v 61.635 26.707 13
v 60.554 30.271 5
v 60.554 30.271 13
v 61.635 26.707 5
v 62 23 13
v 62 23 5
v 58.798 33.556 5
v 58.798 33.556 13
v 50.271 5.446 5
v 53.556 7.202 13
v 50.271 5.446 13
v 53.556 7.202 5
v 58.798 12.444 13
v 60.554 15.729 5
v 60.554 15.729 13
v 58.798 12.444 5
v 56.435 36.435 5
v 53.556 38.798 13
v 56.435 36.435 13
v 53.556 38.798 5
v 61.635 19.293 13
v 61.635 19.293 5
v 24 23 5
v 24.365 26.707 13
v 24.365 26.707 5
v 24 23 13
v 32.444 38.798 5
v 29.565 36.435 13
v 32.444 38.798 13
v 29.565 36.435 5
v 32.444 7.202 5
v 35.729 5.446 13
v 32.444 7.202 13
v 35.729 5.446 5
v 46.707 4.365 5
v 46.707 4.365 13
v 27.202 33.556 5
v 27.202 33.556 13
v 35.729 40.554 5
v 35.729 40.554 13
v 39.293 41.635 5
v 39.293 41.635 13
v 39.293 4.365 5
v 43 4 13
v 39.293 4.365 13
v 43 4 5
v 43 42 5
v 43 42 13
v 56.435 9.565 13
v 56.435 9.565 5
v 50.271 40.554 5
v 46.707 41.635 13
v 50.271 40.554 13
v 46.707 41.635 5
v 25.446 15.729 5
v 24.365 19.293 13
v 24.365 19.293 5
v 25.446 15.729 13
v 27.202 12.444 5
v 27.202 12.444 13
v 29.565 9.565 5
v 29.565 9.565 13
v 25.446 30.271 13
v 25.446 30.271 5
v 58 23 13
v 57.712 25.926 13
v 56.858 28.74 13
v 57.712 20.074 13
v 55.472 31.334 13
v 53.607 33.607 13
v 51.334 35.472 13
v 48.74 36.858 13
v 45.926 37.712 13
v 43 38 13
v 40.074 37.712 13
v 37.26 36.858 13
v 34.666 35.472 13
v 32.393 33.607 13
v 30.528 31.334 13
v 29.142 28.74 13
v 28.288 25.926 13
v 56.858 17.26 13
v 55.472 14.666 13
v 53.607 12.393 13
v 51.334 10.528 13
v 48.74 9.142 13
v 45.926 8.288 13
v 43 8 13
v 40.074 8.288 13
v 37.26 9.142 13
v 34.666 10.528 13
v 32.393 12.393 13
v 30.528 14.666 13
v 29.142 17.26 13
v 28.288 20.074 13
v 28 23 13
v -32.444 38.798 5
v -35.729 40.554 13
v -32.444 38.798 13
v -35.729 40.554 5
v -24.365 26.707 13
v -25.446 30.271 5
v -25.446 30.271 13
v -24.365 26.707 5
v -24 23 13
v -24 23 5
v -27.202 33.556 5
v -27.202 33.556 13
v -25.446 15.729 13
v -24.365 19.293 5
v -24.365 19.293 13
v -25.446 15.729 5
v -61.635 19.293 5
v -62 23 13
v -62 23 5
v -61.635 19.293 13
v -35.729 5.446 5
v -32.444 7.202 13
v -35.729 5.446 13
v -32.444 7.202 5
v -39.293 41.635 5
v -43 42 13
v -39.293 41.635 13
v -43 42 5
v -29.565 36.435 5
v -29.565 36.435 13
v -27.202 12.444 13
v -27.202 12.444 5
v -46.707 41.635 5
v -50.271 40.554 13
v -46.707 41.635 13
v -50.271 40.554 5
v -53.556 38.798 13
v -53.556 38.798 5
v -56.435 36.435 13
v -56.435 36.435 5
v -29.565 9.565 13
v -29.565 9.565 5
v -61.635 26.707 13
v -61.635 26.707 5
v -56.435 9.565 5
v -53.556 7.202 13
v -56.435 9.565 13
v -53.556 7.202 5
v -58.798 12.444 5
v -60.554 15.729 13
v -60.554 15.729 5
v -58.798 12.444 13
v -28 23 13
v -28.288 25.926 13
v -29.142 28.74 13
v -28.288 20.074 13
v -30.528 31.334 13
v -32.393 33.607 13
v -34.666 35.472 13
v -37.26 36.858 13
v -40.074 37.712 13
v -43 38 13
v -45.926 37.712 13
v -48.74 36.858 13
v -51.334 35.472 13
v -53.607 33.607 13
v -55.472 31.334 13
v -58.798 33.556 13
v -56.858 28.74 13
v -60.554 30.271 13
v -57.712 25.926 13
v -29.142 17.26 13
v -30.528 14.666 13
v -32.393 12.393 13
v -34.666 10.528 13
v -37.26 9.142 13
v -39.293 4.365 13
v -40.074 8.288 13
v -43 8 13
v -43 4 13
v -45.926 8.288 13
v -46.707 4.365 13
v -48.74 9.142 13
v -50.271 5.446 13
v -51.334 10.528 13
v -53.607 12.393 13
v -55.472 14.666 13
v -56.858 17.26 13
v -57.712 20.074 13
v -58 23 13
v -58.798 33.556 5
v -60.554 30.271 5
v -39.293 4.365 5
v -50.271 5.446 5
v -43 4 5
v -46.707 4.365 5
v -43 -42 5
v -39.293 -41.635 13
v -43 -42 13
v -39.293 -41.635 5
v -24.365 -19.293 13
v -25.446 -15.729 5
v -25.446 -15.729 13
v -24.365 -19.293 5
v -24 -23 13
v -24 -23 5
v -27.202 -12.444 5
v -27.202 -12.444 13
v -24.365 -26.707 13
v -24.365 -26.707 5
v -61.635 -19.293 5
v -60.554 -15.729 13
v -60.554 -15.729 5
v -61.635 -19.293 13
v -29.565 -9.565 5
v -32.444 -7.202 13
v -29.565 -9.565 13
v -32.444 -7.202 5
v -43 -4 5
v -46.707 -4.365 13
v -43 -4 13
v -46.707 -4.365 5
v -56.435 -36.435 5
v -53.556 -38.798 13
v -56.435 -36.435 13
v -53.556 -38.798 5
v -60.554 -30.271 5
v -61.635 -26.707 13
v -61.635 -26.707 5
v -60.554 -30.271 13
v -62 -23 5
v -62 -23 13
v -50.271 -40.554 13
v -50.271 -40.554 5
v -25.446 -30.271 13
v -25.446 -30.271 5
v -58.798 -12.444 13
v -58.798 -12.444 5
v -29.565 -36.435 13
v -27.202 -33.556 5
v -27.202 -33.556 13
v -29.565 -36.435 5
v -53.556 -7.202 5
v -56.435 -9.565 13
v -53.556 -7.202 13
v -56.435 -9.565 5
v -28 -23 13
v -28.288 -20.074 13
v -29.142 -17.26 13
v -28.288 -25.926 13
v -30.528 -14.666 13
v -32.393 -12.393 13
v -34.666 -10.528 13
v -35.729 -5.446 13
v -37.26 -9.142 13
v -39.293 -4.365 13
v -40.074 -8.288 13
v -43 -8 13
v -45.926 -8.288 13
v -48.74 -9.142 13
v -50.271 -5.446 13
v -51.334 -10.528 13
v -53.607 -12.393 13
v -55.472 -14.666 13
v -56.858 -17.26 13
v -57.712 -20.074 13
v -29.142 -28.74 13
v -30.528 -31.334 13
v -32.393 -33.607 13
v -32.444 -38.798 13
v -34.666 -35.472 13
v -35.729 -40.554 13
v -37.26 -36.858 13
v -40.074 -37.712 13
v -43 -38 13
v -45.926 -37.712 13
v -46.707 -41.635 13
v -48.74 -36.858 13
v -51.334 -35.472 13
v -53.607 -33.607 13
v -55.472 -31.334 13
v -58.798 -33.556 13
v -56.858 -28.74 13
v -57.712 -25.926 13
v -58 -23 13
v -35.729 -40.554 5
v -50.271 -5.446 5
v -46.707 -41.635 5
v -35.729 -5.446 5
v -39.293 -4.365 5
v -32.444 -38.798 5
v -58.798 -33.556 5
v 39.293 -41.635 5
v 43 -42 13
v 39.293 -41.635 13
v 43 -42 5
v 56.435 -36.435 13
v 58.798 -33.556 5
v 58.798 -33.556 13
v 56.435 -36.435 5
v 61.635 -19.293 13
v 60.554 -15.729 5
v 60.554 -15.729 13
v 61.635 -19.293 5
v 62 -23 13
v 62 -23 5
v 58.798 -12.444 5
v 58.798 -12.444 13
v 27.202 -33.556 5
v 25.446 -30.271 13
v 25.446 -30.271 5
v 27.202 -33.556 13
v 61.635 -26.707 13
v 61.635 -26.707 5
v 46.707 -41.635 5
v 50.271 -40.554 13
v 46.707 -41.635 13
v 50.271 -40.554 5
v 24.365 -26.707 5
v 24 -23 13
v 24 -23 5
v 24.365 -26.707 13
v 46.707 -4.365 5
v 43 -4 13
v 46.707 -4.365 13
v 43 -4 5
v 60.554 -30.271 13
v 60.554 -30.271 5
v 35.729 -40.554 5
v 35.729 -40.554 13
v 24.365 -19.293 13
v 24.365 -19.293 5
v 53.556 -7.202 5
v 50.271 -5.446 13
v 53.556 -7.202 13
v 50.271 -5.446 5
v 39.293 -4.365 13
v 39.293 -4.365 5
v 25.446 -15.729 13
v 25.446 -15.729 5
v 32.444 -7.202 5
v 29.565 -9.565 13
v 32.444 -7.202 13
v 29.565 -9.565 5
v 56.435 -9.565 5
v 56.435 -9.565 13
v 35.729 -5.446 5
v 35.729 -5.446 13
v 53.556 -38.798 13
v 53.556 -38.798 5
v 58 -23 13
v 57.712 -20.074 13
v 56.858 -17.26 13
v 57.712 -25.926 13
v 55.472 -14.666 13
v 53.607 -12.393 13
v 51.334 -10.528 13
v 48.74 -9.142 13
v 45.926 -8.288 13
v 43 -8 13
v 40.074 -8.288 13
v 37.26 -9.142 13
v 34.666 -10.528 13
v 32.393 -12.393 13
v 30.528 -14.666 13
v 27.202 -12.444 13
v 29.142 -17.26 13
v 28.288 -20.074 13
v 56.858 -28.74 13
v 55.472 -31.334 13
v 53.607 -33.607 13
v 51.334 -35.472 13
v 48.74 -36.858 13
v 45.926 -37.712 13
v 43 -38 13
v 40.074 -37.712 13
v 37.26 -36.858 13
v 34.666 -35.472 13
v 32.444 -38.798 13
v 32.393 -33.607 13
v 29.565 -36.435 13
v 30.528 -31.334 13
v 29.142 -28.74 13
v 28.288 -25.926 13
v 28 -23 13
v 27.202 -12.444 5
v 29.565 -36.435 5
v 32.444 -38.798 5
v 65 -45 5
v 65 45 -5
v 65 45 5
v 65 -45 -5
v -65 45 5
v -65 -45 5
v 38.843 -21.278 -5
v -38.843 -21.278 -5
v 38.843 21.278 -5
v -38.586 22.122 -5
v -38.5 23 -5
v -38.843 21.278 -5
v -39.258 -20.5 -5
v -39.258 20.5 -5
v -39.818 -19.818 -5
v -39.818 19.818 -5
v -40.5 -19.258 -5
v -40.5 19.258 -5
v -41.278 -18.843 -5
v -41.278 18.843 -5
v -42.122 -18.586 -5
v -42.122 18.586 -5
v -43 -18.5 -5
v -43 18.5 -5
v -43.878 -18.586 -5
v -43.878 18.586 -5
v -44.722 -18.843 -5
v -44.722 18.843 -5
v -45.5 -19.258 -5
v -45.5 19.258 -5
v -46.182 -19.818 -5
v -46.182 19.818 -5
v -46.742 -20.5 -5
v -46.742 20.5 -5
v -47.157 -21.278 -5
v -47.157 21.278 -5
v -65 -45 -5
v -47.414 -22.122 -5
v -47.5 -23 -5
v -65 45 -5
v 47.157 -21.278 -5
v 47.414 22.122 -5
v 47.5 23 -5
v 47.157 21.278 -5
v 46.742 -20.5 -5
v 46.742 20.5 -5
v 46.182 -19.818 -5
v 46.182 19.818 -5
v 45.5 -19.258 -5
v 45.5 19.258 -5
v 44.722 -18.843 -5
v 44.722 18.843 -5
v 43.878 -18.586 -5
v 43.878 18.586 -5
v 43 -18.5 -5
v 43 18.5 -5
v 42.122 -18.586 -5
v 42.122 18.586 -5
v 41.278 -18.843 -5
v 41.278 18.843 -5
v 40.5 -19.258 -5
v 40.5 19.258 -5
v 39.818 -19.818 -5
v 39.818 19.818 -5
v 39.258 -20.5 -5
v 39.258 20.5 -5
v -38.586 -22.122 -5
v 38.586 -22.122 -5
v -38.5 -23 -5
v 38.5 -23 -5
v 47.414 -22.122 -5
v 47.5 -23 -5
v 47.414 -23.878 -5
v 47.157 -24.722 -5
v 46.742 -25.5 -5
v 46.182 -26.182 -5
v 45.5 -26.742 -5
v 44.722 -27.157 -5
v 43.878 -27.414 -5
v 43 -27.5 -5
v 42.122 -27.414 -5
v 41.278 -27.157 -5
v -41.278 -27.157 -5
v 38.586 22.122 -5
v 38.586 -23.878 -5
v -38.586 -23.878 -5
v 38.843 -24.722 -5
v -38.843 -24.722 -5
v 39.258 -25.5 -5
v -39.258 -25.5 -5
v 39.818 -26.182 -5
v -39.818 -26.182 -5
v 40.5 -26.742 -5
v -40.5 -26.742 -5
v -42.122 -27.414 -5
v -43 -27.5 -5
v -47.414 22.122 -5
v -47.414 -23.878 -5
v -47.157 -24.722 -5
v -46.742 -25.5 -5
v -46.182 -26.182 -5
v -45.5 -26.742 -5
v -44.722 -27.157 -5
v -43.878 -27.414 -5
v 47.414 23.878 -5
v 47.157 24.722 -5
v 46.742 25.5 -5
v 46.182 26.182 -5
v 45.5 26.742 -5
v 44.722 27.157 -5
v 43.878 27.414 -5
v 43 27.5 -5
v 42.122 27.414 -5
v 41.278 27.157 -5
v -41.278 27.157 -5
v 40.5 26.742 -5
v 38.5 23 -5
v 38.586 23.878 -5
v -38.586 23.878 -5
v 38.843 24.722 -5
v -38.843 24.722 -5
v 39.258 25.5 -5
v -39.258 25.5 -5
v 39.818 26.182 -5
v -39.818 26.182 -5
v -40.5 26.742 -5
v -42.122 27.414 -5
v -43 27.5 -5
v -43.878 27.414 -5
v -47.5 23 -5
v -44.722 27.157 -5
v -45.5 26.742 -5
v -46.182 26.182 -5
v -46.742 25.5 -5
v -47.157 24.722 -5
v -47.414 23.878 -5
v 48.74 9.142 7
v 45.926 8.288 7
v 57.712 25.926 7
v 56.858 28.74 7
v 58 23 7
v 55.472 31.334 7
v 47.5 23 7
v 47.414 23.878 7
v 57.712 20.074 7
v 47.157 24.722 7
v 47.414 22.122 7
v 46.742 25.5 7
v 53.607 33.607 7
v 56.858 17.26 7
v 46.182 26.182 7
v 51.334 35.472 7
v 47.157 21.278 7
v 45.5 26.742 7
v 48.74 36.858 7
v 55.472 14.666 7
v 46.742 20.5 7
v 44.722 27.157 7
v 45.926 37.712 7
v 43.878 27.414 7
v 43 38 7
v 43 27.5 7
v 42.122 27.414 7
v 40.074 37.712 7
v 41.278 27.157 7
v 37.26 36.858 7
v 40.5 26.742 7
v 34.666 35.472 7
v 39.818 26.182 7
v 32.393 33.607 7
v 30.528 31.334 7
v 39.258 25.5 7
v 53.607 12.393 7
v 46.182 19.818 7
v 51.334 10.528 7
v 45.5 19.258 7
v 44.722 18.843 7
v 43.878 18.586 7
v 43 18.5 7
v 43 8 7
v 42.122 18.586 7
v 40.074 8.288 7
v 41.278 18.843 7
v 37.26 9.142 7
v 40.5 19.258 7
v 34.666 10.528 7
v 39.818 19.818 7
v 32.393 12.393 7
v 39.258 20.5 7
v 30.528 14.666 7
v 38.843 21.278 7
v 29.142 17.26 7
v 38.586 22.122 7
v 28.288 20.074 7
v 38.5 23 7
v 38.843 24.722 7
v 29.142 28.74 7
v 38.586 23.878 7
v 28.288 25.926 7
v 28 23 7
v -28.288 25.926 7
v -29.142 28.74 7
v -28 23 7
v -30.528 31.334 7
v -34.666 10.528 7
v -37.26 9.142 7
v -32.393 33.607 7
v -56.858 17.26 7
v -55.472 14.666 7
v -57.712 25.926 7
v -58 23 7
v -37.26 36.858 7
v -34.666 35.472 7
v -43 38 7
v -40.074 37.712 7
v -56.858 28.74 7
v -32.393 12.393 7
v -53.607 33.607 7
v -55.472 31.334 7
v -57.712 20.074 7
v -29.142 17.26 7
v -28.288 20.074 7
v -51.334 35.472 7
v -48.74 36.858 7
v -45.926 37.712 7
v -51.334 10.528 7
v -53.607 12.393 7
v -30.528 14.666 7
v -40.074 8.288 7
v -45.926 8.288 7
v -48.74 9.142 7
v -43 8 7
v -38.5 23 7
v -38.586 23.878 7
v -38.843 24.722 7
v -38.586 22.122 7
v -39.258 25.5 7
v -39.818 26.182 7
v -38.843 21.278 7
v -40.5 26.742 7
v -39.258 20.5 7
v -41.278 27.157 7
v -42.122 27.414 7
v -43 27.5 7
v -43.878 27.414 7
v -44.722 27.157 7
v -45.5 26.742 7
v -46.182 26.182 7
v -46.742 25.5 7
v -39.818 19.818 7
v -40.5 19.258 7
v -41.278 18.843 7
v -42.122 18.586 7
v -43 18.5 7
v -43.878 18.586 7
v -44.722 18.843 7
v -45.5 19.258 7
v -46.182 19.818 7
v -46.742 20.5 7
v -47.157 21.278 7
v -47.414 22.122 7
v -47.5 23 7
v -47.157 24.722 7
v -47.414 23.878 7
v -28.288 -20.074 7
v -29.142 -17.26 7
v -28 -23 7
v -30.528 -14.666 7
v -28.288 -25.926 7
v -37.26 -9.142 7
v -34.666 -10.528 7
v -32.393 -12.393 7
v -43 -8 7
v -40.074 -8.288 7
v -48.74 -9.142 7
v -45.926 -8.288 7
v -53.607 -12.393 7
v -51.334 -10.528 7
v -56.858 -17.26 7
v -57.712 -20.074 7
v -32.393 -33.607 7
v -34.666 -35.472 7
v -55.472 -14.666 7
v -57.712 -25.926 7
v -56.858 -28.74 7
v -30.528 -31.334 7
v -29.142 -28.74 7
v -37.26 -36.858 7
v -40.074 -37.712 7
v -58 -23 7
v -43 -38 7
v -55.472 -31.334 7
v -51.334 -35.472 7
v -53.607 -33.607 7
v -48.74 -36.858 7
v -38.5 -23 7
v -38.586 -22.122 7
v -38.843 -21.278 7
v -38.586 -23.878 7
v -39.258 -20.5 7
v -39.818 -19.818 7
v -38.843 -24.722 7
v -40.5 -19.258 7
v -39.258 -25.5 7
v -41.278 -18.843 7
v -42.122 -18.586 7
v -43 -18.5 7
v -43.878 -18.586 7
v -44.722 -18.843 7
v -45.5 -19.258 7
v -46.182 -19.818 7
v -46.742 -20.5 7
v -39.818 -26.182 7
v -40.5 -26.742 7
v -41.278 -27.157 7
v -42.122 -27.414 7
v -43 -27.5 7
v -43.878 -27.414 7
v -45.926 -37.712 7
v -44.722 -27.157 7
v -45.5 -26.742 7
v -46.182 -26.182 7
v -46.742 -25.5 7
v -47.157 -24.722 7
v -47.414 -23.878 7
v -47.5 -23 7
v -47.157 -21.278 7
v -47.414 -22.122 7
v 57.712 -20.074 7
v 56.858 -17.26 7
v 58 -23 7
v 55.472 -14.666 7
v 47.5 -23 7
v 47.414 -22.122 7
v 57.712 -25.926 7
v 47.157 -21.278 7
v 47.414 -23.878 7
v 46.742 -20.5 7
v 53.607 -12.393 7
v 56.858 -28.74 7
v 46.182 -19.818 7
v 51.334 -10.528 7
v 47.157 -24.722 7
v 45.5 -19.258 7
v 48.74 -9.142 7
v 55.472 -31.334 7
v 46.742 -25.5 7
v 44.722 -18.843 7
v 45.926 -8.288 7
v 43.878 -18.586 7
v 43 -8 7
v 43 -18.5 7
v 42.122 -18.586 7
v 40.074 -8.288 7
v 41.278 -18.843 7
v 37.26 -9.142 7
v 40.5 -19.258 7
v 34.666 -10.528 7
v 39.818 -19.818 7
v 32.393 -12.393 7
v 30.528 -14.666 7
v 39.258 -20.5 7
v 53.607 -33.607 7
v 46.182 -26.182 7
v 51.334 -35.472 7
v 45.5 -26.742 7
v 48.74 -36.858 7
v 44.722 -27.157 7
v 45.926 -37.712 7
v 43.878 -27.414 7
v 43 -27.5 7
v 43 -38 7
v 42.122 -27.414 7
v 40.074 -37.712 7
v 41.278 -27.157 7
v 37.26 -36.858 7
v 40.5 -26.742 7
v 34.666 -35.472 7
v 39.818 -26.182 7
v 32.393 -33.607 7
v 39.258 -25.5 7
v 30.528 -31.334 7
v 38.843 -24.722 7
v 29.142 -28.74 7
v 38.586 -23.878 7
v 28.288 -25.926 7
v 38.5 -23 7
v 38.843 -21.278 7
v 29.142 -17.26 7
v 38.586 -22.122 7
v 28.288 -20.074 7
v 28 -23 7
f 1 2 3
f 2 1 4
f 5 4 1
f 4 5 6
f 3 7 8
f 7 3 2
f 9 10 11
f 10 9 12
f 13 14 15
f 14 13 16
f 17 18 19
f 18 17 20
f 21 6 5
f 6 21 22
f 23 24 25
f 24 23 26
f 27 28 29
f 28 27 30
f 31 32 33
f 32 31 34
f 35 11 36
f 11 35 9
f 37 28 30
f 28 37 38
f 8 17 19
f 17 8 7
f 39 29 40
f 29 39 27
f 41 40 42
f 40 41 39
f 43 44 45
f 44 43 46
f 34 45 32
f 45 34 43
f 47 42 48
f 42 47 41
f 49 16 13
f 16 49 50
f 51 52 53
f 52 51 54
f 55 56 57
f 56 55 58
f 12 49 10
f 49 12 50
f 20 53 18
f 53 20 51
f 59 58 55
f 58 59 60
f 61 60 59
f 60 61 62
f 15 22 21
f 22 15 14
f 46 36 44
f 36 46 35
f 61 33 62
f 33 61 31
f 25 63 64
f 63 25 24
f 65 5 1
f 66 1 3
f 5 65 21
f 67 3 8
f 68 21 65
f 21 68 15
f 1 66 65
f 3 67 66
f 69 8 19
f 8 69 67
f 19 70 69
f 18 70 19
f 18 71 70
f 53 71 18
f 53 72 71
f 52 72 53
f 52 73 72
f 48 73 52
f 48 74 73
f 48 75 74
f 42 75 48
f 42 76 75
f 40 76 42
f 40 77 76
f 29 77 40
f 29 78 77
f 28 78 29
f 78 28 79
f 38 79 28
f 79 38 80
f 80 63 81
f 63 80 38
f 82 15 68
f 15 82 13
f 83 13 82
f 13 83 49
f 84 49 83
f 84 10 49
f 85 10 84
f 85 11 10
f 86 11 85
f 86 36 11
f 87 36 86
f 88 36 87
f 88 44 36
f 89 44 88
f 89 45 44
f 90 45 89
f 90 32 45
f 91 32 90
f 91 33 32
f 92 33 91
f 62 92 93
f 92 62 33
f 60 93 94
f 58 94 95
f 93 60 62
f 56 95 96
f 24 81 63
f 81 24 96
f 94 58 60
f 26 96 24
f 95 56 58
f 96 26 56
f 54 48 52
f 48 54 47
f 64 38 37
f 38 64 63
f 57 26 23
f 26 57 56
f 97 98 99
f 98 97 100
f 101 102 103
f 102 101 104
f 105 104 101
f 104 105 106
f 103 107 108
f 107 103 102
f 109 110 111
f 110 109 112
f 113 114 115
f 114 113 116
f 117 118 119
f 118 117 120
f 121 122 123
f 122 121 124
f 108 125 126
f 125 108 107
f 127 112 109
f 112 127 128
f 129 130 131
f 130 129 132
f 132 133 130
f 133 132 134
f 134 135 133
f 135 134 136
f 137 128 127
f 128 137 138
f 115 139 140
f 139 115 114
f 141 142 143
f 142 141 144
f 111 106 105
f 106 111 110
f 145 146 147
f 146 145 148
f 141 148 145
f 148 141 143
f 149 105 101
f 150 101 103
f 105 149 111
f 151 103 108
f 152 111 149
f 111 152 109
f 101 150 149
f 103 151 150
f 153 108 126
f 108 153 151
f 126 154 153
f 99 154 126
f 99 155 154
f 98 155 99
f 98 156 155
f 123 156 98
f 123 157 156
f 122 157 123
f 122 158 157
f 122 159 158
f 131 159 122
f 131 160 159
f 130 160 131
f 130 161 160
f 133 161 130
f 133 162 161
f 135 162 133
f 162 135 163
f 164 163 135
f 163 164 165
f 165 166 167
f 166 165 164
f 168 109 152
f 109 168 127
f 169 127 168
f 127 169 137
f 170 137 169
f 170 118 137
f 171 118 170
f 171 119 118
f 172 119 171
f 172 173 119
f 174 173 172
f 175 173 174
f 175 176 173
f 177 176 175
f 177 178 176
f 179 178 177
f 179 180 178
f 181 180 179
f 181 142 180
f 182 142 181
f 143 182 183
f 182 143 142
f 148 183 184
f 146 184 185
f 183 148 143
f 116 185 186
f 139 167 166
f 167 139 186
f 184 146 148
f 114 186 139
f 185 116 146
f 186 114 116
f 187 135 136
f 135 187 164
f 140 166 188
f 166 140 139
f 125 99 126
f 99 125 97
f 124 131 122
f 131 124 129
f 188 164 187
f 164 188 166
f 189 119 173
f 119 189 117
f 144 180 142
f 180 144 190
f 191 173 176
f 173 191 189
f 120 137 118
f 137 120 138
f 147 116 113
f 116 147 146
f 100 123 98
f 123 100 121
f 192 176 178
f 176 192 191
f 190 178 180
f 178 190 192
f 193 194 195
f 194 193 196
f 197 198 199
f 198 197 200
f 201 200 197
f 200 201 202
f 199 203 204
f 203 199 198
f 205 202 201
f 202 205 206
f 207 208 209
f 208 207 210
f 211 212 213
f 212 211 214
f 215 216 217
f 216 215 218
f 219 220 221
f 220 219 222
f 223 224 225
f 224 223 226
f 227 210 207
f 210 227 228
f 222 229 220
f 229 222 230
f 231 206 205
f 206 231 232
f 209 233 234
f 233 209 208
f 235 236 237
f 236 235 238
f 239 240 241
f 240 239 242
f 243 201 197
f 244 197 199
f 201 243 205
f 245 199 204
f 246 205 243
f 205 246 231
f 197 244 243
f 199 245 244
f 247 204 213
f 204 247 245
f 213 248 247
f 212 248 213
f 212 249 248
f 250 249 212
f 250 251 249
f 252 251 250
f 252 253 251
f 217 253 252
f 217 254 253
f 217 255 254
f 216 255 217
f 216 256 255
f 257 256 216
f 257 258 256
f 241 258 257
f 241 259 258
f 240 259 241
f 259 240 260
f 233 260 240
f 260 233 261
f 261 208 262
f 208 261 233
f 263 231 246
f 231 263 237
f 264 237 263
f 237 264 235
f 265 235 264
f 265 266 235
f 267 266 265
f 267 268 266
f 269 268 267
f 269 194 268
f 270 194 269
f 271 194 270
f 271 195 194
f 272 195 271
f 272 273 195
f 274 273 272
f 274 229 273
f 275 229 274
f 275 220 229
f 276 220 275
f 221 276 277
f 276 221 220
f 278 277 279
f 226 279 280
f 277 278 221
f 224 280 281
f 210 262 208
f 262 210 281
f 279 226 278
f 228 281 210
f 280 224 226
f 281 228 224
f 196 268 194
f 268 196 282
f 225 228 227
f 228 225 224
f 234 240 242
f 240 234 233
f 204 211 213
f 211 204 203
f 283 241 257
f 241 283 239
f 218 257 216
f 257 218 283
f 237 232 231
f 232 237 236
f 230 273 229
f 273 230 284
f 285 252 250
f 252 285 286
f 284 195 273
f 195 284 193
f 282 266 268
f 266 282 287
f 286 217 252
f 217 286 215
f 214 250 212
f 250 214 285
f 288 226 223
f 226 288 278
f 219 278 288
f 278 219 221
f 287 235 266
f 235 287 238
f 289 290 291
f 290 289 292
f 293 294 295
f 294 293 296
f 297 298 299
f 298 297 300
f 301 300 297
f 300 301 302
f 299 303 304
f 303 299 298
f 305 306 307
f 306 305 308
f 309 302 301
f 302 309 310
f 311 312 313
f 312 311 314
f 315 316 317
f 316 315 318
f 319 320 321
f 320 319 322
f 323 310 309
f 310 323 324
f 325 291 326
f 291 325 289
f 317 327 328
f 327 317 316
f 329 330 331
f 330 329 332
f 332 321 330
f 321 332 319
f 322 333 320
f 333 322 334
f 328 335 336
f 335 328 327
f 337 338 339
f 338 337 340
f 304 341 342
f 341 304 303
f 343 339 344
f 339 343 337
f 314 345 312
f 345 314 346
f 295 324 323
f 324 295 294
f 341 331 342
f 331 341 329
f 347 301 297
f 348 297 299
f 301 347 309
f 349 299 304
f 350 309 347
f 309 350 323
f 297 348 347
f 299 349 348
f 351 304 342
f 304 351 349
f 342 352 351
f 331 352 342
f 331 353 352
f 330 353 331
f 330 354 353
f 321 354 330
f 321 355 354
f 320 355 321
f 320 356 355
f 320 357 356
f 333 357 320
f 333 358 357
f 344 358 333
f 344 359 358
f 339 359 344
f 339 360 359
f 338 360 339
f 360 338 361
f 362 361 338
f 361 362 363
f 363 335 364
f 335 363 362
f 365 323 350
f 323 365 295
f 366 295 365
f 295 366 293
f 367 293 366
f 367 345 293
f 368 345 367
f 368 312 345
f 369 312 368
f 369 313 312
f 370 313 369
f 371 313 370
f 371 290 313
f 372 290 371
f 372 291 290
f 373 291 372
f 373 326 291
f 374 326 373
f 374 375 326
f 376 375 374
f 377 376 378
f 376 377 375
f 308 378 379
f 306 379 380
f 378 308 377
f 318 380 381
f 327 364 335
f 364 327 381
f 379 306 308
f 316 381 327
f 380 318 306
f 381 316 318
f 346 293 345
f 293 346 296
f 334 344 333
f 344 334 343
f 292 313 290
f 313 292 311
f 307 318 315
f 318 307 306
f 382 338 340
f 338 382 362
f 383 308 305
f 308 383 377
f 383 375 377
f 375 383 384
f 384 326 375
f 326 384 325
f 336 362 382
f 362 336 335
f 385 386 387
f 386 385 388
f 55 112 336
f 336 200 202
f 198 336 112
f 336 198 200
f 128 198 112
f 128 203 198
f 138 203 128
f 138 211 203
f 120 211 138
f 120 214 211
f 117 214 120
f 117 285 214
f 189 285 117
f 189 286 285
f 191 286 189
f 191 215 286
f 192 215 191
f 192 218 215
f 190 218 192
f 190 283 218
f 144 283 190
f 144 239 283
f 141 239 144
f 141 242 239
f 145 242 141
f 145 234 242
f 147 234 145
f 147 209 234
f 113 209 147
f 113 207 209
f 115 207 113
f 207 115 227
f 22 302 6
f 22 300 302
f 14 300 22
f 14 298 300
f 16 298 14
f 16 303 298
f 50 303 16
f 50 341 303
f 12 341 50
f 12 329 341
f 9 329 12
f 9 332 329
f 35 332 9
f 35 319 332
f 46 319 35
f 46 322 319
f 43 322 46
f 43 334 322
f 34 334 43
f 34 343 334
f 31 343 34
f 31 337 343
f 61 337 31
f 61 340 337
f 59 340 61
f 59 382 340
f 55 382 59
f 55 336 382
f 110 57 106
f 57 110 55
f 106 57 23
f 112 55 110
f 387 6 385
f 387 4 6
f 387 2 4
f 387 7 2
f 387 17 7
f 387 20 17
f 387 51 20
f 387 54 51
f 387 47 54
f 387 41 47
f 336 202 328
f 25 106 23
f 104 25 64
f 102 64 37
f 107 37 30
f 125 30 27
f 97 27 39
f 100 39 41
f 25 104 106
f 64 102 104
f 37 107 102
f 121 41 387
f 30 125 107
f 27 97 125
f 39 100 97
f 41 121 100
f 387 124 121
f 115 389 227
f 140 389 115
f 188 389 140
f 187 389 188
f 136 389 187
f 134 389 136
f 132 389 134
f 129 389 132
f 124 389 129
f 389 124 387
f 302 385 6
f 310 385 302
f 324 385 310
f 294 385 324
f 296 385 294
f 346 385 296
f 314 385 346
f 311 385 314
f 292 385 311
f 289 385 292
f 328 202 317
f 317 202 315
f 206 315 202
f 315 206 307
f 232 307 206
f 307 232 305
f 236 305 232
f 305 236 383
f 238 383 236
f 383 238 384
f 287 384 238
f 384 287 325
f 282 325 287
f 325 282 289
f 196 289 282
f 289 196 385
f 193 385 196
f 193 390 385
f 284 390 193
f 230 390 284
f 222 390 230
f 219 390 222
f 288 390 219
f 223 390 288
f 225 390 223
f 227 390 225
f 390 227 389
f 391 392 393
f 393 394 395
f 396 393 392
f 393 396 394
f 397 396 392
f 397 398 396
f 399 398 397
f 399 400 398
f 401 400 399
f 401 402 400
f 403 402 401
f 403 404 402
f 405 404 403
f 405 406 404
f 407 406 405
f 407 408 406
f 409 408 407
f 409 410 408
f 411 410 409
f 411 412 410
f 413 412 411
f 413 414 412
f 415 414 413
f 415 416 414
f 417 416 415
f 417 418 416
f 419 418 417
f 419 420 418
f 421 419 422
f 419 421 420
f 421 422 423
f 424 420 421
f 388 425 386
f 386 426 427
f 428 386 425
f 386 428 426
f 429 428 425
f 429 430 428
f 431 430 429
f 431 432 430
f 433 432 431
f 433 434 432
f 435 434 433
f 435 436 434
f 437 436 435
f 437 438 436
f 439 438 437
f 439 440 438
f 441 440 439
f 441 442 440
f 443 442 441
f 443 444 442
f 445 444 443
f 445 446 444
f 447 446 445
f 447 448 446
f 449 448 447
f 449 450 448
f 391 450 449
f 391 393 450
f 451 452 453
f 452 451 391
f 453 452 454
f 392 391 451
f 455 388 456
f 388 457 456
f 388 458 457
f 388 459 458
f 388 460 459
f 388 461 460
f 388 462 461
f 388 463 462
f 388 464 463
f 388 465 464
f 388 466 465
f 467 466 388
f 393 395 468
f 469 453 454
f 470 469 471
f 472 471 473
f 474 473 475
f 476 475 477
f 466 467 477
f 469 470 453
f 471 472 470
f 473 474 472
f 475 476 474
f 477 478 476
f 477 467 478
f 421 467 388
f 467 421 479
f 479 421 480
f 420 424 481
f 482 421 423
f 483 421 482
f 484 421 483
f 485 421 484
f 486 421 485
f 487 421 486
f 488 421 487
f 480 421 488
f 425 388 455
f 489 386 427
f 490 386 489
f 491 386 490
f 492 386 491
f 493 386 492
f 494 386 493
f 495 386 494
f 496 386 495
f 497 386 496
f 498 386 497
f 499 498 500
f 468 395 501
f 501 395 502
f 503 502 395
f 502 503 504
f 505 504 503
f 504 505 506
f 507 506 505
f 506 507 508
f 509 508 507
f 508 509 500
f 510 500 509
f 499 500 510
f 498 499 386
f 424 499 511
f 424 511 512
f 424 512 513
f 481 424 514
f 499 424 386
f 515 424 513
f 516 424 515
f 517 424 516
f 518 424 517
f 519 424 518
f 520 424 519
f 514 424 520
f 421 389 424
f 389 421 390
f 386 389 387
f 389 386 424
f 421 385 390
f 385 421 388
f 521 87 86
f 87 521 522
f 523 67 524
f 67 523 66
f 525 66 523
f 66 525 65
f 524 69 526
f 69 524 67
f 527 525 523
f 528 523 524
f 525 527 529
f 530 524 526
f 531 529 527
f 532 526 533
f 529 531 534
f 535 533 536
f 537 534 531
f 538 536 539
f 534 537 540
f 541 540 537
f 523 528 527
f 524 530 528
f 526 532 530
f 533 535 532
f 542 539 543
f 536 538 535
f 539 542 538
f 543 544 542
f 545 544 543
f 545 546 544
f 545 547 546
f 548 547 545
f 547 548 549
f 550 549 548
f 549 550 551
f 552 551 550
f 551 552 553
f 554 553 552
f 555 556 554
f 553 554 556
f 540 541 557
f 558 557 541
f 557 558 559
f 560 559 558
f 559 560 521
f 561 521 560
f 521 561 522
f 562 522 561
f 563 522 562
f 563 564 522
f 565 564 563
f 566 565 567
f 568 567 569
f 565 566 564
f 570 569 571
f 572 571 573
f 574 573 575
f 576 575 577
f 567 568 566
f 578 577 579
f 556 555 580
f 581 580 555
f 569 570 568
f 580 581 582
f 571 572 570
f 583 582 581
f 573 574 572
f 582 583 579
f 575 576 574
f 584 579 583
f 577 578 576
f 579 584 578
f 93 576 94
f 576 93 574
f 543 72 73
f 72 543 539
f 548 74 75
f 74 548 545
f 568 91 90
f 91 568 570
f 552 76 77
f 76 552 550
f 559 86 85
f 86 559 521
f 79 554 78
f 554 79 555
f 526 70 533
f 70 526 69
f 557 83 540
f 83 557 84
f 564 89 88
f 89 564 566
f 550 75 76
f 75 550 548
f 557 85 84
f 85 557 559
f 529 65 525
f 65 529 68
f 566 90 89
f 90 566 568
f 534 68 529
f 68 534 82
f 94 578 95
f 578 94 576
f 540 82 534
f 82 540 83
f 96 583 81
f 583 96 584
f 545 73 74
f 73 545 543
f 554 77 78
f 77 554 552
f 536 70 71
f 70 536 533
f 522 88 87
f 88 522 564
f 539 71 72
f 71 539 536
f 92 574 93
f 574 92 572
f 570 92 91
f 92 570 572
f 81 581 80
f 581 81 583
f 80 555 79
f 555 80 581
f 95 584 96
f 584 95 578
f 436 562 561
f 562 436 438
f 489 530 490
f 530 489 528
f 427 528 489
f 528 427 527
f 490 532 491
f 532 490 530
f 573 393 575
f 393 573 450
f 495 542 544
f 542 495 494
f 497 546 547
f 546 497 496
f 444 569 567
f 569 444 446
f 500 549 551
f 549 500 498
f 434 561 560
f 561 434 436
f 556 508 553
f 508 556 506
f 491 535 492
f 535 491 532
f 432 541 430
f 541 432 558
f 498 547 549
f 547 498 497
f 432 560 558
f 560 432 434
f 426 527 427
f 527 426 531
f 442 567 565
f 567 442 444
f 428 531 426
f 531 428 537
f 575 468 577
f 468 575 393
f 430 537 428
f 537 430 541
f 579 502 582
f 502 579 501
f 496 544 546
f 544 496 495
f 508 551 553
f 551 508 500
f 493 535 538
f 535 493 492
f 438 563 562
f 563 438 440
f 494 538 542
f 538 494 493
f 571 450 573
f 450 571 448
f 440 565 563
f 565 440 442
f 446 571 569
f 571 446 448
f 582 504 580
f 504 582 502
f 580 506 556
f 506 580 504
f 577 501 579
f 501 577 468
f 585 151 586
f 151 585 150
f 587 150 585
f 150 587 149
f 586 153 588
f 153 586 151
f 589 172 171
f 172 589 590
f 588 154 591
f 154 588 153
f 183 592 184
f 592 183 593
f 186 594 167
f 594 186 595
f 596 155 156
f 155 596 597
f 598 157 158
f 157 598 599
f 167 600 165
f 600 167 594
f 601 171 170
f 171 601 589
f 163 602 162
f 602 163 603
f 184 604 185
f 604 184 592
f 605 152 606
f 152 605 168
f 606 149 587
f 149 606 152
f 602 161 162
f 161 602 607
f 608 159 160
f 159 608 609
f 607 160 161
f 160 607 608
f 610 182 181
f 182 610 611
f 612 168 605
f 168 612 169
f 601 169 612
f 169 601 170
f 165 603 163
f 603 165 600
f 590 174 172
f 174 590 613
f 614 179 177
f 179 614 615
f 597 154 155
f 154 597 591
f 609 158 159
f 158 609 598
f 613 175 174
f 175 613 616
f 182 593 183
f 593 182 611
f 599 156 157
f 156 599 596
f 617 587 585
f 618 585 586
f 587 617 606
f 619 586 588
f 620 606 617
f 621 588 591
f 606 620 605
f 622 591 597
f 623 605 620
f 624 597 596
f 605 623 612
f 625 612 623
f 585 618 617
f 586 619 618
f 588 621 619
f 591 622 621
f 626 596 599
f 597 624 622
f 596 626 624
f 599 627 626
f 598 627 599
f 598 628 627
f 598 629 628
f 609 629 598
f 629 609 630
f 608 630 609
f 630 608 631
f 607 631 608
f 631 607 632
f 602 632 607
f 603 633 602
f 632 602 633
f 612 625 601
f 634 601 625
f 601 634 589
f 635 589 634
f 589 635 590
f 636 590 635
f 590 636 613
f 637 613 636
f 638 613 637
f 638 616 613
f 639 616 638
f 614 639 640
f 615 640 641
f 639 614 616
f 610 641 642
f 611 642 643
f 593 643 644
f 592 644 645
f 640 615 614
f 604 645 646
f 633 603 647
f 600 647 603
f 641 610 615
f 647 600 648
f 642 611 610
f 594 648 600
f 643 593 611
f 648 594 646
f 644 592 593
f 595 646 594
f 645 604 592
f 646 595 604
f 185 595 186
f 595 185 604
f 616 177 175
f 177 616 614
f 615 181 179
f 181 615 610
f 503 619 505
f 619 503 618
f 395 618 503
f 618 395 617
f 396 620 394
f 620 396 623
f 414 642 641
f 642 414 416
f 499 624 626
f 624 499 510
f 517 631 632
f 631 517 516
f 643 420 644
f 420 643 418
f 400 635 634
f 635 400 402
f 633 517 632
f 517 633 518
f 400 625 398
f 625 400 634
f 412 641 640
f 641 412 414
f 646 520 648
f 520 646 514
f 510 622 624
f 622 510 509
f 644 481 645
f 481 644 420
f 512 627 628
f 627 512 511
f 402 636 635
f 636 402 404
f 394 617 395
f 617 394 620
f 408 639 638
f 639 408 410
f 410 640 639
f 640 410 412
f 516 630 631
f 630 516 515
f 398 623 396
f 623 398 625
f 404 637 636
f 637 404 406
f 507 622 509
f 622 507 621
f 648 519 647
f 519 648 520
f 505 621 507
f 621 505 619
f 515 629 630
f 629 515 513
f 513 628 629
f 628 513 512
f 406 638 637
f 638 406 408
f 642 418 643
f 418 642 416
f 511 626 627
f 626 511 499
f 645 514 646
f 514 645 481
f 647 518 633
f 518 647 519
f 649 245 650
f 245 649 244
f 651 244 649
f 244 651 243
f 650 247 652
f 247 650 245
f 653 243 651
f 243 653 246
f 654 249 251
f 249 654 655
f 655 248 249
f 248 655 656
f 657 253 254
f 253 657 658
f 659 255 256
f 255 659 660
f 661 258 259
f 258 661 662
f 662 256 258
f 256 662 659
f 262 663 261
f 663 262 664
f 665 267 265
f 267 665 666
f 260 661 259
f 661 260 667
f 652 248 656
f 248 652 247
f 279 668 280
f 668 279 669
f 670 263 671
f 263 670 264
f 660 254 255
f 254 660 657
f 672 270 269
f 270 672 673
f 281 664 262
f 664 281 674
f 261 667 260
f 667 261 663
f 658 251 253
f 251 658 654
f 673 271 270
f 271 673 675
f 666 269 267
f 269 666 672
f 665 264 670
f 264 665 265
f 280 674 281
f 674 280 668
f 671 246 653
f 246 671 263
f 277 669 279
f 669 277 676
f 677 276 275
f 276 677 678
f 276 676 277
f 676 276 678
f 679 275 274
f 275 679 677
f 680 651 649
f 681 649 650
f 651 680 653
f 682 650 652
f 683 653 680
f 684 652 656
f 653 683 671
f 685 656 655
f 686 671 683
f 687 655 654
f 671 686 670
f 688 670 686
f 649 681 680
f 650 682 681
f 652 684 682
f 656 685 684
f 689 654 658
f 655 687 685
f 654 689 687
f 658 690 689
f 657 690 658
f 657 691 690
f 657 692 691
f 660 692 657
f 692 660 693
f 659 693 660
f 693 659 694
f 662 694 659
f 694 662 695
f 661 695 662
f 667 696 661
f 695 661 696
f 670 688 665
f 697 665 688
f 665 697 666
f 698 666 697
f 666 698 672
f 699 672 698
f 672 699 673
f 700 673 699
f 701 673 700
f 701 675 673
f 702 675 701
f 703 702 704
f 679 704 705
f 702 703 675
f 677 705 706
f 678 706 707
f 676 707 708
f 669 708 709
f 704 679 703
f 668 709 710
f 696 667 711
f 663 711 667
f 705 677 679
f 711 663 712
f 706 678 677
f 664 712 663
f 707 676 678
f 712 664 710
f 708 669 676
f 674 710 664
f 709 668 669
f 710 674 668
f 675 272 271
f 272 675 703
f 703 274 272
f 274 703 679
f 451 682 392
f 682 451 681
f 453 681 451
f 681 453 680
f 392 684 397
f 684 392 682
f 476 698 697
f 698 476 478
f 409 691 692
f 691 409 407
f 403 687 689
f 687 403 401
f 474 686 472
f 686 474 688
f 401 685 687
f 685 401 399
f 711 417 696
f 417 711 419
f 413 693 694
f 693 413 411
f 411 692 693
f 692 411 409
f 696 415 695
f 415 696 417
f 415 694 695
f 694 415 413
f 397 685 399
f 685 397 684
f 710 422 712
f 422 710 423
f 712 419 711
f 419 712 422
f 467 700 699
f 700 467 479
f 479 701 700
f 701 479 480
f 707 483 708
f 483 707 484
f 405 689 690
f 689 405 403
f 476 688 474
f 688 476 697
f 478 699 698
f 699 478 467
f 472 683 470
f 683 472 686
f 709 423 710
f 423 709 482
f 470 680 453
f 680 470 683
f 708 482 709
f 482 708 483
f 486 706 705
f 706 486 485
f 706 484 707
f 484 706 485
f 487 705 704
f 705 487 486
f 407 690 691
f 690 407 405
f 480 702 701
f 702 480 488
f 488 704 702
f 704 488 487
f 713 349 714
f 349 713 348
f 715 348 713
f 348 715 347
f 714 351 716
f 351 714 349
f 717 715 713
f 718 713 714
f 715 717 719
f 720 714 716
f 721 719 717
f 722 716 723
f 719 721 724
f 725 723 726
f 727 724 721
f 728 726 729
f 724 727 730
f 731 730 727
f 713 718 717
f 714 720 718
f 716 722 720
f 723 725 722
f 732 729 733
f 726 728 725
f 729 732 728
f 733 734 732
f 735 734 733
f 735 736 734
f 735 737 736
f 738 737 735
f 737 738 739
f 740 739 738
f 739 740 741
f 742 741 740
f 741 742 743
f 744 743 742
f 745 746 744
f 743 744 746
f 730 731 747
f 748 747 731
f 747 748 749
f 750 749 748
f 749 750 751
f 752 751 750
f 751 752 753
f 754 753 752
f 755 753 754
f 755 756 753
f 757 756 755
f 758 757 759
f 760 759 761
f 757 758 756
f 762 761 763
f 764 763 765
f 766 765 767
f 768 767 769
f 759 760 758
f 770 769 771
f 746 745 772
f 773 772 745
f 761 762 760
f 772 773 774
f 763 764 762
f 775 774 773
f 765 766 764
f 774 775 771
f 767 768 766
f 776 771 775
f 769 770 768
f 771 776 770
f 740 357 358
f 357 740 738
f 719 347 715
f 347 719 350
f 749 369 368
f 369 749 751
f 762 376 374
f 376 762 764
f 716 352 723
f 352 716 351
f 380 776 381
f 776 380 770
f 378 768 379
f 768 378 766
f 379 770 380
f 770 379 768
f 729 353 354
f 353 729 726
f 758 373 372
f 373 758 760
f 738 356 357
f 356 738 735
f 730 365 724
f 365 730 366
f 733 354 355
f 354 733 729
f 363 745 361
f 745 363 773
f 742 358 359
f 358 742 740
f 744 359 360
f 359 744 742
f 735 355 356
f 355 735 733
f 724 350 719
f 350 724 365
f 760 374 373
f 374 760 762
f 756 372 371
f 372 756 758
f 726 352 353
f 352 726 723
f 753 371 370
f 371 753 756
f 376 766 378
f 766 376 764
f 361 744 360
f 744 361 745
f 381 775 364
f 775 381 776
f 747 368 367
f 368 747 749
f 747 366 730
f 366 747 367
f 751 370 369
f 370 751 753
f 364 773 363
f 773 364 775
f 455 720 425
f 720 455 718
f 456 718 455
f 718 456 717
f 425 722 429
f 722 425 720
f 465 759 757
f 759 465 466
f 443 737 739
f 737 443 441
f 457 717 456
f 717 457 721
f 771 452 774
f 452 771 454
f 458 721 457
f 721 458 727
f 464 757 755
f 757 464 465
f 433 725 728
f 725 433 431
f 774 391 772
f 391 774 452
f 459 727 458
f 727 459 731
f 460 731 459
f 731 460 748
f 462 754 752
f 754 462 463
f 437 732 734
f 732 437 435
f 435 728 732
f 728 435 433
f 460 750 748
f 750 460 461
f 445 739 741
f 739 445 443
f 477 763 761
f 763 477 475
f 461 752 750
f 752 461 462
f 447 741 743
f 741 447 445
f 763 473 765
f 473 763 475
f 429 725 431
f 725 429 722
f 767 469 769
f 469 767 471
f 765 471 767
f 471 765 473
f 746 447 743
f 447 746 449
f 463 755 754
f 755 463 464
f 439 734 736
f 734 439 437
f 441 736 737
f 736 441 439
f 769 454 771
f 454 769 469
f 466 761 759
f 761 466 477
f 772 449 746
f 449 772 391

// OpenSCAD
$fn = 32;

// ----------------------------------------------------------------------
// Socket pad plate
// bosses with counterbored sockets for the screws
// ----------------------------------------------------------------------

// --- parameters (mm) ---
base_t = 10;            // base plate thickness
boss_h = 8;             // boss height above the base plate
boss_d = 38;            // boss diameter
socket_d = 30;          // socket diameter
socket_depth = 6;       // socket depth from the boss face
bolt_d = 9;             // screw clearance hole through the socket floor
plate = [130, 90, 10];  // overall size (x, y, z)
edge = 22;              // boss centre offset from the plate edge
pads = 4;               // boss count, one per corner

// --- derived feature positions (mm) ---
height = base_t + boss_h;        // = 18   overall height of the part
corner_x = plate[0] / 2 - edge;  // = 43   boss centre X
corner_y = plate[1] / 2 - edge;  // = 23   boss centre Y
feature_centers = [
  [corner_x, corner_y],
  [-corner_x, corner_y],
  [-corner_x, -corner_y],
  [corner_x, -corner_y]
];   // boss centres: sockets, holes and the pads themselves are placed from here

// base plate, bosses on feature_centers, socket + through hole in each
difference() {
  union() {
    cube(plate, center = true);
    for (centre = feature_centers)
      translate([centre[0], centre[1], plate[2] / 2 - 1])
        cylinder(d = boss_d, h = boss_h + 1);
  }
  for (centre = feature_centers) {
    translate([centre[0], centre[1], plate[2] / 2 + boss_h - socket_depth])
      cylinder(d = socket_d, h = socket_depth + 1);
    translate([centre[0], centre[1], -height])
      cylinder(d = bolt_d, h = 2 * height + 2);  // through the socket floor
  }
}
